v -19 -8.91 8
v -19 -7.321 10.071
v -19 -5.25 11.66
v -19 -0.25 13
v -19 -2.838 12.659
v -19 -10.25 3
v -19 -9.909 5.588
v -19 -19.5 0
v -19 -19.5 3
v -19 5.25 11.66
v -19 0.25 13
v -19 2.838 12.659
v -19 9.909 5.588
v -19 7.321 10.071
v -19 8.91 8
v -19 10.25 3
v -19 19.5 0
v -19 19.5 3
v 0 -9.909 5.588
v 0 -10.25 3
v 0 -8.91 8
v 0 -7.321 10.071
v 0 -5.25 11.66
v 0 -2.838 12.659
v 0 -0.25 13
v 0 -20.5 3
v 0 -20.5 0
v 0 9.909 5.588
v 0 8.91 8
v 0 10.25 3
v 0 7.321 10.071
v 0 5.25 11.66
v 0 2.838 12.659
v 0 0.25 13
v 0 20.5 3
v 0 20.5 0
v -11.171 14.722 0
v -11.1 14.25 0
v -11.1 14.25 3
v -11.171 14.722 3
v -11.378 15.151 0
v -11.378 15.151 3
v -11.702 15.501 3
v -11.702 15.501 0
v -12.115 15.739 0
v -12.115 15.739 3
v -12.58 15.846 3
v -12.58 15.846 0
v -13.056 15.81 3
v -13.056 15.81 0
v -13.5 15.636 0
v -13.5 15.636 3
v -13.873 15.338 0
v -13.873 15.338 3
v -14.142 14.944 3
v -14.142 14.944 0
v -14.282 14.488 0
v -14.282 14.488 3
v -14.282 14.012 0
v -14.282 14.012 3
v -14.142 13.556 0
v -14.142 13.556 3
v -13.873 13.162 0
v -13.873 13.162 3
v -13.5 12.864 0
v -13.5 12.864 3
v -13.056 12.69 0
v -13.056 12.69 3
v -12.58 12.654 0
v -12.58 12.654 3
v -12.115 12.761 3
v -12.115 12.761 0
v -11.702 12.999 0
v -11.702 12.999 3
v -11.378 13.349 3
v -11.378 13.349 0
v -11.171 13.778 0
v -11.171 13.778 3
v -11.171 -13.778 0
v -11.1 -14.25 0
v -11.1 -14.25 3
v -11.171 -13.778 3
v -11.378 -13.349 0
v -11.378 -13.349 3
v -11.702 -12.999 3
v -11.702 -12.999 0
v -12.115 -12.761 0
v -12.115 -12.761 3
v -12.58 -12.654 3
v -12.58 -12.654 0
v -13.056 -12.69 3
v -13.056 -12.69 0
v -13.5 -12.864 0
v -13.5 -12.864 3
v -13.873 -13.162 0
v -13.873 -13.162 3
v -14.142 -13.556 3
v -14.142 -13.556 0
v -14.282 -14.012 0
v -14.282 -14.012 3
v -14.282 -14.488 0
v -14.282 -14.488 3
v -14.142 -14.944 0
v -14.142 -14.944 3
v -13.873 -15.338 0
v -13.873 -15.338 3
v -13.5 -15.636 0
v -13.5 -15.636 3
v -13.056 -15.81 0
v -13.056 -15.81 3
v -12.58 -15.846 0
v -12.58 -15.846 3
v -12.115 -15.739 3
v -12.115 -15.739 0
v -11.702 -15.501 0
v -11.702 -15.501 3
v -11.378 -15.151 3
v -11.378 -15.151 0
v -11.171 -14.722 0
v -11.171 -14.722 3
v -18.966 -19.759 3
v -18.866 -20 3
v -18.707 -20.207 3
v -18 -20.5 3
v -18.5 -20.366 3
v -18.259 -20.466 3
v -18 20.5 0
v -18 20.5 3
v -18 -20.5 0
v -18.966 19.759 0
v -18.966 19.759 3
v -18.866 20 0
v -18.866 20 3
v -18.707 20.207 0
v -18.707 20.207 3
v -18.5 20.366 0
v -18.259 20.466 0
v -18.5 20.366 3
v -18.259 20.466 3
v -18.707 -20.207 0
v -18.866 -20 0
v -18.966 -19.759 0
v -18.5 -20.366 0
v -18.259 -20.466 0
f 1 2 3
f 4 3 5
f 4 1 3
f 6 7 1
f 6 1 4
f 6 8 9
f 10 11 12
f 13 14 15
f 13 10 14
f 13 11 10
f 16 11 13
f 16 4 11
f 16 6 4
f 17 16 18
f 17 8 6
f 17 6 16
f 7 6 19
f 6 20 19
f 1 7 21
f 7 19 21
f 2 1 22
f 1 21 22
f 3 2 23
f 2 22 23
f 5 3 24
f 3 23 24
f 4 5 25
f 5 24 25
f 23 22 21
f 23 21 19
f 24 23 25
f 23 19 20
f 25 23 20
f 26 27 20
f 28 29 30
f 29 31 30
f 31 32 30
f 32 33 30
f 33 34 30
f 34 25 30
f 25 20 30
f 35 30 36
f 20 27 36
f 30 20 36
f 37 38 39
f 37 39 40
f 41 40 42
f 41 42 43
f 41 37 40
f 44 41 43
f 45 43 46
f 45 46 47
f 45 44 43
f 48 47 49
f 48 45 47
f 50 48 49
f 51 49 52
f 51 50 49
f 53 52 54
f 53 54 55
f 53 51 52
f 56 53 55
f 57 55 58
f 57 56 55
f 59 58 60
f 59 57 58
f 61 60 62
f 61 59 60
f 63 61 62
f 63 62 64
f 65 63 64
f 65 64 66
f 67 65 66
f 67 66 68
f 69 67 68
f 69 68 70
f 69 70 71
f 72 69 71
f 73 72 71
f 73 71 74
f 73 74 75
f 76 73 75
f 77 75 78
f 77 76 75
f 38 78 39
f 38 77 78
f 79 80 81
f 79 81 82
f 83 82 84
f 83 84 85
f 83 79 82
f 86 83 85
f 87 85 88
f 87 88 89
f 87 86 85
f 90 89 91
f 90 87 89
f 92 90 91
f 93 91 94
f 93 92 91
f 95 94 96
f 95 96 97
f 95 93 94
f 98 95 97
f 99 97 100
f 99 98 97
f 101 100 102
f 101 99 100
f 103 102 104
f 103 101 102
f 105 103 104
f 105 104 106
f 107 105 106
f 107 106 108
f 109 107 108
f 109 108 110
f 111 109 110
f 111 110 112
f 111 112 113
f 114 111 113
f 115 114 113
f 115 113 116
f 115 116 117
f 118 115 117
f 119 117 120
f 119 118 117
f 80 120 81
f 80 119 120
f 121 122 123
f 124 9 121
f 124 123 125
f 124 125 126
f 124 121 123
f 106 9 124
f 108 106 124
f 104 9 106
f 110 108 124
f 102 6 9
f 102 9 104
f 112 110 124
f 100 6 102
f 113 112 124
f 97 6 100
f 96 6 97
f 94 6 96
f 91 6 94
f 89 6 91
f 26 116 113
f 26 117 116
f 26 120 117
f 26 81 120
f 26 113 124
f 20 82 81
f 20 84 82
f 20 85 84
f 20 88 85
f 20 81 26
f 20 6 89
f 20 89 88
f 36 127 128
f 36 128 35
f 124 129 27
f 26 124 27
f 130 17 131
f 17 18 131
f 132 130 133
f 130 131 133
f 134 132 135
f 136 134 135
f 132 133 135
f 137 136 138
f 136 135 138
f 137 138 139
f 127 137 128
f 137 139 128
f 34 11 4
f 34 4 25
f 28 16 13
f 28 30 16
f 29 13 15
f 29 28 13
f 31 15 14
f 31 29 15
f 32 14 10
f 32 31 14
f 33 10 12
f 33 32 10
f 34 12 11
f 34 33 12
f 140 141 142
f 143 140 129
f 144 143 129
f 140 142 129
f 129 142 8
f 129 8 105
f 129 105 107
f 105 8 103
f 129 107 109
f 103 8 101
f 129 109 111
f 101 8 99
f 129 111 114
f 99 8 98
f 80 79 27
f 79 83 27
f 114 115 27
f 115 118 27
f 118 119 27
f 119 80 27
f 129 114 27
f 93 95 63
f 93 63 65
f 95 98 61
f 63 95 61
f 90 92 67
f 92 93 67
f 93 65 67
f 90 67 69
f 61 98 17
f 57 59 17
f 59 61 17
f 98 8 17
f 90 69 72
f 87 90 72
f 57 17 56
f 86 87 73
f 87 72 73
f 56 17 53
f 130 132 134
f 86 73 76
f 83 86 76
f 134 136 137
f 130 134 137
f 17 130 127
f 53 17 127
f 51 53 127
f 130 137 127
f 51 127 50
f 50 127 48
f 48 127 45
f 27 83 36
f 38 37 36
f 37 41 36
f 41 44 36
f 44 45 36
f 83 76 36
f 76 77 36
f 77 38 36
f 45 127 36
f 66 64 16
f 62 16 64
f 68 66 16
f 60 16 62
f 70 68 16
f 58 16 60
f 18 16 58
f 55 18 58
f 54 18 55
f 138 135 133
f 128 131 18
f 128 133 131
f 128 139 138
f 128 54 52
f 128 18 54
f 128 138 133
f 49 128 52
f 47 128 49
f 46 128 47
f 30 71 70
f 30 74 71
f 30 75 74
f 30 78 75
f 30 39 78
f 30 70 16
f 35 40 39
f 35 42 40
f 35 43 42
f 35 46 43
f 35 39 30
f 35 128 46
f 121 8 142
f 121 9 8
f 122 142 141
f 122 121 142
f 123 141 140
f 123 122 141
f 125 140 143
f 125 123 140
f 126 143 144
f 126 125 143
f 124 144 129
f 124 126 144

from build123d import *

# Parameters (mm, degrees)
F0_W     = 19
F0_H     = 41
F0_R     = 1.6
F1_DEPTH = 3
F2_R     = 1
F3_W     = 19
F3_H     = 20.5
F4_DEPTH = 10
F5_R     = 9.99999


# Not quite as in the source:
# - a fillet or chamfer is up to 0.001 mm smaller than in the source, because OpenCascade refuses the exact size


with BuildPart() as f1:
    # F0 (on Top) → F1 (new body)
    with BuildSketch(Plane.XY):
        with Locations((-9.5, 0)):
            Rectangle(F0_W, F0_H)
        with Locations((-12.7, -14.25)):
            Circle(F0_R, mode=Mode.SUBTRACT)
        with Locations((-12.7, 14.25)):
            Circle(F0_R, mode=Mode.SUBTRACT)
    extrude(amount=F1_DEPTH)

    # F2
    f2_edges = [f1.edges().sort_by_distance(p)[0] for p in [
        (-19, -20.5, 1.5),
        (-19, 20.5, 1.5),
    ]]
    fillet(f2_edges, radius=F2_R)

    # F3 (on face) → F4 (join)
    with BuildSketch(Plane.XY.offset(3)):
        with Locations((-9.5, 0)):
            Rectangle(F3_W, F3_H)
    extrude(amount=F4_DEPTH)

    # F5 (radius 10 in the source; OpenCascade refuses exactly that, so slightly less here)
    f5_edges = [f1.edges().sort_by_distance(p)[0] for p in [
        (-9.5, 10.25, 13),
        (-9.5, -10.25, 13),
    ]]
    fillet(f5_edges, radius=F5_R)


solid = f1.part
